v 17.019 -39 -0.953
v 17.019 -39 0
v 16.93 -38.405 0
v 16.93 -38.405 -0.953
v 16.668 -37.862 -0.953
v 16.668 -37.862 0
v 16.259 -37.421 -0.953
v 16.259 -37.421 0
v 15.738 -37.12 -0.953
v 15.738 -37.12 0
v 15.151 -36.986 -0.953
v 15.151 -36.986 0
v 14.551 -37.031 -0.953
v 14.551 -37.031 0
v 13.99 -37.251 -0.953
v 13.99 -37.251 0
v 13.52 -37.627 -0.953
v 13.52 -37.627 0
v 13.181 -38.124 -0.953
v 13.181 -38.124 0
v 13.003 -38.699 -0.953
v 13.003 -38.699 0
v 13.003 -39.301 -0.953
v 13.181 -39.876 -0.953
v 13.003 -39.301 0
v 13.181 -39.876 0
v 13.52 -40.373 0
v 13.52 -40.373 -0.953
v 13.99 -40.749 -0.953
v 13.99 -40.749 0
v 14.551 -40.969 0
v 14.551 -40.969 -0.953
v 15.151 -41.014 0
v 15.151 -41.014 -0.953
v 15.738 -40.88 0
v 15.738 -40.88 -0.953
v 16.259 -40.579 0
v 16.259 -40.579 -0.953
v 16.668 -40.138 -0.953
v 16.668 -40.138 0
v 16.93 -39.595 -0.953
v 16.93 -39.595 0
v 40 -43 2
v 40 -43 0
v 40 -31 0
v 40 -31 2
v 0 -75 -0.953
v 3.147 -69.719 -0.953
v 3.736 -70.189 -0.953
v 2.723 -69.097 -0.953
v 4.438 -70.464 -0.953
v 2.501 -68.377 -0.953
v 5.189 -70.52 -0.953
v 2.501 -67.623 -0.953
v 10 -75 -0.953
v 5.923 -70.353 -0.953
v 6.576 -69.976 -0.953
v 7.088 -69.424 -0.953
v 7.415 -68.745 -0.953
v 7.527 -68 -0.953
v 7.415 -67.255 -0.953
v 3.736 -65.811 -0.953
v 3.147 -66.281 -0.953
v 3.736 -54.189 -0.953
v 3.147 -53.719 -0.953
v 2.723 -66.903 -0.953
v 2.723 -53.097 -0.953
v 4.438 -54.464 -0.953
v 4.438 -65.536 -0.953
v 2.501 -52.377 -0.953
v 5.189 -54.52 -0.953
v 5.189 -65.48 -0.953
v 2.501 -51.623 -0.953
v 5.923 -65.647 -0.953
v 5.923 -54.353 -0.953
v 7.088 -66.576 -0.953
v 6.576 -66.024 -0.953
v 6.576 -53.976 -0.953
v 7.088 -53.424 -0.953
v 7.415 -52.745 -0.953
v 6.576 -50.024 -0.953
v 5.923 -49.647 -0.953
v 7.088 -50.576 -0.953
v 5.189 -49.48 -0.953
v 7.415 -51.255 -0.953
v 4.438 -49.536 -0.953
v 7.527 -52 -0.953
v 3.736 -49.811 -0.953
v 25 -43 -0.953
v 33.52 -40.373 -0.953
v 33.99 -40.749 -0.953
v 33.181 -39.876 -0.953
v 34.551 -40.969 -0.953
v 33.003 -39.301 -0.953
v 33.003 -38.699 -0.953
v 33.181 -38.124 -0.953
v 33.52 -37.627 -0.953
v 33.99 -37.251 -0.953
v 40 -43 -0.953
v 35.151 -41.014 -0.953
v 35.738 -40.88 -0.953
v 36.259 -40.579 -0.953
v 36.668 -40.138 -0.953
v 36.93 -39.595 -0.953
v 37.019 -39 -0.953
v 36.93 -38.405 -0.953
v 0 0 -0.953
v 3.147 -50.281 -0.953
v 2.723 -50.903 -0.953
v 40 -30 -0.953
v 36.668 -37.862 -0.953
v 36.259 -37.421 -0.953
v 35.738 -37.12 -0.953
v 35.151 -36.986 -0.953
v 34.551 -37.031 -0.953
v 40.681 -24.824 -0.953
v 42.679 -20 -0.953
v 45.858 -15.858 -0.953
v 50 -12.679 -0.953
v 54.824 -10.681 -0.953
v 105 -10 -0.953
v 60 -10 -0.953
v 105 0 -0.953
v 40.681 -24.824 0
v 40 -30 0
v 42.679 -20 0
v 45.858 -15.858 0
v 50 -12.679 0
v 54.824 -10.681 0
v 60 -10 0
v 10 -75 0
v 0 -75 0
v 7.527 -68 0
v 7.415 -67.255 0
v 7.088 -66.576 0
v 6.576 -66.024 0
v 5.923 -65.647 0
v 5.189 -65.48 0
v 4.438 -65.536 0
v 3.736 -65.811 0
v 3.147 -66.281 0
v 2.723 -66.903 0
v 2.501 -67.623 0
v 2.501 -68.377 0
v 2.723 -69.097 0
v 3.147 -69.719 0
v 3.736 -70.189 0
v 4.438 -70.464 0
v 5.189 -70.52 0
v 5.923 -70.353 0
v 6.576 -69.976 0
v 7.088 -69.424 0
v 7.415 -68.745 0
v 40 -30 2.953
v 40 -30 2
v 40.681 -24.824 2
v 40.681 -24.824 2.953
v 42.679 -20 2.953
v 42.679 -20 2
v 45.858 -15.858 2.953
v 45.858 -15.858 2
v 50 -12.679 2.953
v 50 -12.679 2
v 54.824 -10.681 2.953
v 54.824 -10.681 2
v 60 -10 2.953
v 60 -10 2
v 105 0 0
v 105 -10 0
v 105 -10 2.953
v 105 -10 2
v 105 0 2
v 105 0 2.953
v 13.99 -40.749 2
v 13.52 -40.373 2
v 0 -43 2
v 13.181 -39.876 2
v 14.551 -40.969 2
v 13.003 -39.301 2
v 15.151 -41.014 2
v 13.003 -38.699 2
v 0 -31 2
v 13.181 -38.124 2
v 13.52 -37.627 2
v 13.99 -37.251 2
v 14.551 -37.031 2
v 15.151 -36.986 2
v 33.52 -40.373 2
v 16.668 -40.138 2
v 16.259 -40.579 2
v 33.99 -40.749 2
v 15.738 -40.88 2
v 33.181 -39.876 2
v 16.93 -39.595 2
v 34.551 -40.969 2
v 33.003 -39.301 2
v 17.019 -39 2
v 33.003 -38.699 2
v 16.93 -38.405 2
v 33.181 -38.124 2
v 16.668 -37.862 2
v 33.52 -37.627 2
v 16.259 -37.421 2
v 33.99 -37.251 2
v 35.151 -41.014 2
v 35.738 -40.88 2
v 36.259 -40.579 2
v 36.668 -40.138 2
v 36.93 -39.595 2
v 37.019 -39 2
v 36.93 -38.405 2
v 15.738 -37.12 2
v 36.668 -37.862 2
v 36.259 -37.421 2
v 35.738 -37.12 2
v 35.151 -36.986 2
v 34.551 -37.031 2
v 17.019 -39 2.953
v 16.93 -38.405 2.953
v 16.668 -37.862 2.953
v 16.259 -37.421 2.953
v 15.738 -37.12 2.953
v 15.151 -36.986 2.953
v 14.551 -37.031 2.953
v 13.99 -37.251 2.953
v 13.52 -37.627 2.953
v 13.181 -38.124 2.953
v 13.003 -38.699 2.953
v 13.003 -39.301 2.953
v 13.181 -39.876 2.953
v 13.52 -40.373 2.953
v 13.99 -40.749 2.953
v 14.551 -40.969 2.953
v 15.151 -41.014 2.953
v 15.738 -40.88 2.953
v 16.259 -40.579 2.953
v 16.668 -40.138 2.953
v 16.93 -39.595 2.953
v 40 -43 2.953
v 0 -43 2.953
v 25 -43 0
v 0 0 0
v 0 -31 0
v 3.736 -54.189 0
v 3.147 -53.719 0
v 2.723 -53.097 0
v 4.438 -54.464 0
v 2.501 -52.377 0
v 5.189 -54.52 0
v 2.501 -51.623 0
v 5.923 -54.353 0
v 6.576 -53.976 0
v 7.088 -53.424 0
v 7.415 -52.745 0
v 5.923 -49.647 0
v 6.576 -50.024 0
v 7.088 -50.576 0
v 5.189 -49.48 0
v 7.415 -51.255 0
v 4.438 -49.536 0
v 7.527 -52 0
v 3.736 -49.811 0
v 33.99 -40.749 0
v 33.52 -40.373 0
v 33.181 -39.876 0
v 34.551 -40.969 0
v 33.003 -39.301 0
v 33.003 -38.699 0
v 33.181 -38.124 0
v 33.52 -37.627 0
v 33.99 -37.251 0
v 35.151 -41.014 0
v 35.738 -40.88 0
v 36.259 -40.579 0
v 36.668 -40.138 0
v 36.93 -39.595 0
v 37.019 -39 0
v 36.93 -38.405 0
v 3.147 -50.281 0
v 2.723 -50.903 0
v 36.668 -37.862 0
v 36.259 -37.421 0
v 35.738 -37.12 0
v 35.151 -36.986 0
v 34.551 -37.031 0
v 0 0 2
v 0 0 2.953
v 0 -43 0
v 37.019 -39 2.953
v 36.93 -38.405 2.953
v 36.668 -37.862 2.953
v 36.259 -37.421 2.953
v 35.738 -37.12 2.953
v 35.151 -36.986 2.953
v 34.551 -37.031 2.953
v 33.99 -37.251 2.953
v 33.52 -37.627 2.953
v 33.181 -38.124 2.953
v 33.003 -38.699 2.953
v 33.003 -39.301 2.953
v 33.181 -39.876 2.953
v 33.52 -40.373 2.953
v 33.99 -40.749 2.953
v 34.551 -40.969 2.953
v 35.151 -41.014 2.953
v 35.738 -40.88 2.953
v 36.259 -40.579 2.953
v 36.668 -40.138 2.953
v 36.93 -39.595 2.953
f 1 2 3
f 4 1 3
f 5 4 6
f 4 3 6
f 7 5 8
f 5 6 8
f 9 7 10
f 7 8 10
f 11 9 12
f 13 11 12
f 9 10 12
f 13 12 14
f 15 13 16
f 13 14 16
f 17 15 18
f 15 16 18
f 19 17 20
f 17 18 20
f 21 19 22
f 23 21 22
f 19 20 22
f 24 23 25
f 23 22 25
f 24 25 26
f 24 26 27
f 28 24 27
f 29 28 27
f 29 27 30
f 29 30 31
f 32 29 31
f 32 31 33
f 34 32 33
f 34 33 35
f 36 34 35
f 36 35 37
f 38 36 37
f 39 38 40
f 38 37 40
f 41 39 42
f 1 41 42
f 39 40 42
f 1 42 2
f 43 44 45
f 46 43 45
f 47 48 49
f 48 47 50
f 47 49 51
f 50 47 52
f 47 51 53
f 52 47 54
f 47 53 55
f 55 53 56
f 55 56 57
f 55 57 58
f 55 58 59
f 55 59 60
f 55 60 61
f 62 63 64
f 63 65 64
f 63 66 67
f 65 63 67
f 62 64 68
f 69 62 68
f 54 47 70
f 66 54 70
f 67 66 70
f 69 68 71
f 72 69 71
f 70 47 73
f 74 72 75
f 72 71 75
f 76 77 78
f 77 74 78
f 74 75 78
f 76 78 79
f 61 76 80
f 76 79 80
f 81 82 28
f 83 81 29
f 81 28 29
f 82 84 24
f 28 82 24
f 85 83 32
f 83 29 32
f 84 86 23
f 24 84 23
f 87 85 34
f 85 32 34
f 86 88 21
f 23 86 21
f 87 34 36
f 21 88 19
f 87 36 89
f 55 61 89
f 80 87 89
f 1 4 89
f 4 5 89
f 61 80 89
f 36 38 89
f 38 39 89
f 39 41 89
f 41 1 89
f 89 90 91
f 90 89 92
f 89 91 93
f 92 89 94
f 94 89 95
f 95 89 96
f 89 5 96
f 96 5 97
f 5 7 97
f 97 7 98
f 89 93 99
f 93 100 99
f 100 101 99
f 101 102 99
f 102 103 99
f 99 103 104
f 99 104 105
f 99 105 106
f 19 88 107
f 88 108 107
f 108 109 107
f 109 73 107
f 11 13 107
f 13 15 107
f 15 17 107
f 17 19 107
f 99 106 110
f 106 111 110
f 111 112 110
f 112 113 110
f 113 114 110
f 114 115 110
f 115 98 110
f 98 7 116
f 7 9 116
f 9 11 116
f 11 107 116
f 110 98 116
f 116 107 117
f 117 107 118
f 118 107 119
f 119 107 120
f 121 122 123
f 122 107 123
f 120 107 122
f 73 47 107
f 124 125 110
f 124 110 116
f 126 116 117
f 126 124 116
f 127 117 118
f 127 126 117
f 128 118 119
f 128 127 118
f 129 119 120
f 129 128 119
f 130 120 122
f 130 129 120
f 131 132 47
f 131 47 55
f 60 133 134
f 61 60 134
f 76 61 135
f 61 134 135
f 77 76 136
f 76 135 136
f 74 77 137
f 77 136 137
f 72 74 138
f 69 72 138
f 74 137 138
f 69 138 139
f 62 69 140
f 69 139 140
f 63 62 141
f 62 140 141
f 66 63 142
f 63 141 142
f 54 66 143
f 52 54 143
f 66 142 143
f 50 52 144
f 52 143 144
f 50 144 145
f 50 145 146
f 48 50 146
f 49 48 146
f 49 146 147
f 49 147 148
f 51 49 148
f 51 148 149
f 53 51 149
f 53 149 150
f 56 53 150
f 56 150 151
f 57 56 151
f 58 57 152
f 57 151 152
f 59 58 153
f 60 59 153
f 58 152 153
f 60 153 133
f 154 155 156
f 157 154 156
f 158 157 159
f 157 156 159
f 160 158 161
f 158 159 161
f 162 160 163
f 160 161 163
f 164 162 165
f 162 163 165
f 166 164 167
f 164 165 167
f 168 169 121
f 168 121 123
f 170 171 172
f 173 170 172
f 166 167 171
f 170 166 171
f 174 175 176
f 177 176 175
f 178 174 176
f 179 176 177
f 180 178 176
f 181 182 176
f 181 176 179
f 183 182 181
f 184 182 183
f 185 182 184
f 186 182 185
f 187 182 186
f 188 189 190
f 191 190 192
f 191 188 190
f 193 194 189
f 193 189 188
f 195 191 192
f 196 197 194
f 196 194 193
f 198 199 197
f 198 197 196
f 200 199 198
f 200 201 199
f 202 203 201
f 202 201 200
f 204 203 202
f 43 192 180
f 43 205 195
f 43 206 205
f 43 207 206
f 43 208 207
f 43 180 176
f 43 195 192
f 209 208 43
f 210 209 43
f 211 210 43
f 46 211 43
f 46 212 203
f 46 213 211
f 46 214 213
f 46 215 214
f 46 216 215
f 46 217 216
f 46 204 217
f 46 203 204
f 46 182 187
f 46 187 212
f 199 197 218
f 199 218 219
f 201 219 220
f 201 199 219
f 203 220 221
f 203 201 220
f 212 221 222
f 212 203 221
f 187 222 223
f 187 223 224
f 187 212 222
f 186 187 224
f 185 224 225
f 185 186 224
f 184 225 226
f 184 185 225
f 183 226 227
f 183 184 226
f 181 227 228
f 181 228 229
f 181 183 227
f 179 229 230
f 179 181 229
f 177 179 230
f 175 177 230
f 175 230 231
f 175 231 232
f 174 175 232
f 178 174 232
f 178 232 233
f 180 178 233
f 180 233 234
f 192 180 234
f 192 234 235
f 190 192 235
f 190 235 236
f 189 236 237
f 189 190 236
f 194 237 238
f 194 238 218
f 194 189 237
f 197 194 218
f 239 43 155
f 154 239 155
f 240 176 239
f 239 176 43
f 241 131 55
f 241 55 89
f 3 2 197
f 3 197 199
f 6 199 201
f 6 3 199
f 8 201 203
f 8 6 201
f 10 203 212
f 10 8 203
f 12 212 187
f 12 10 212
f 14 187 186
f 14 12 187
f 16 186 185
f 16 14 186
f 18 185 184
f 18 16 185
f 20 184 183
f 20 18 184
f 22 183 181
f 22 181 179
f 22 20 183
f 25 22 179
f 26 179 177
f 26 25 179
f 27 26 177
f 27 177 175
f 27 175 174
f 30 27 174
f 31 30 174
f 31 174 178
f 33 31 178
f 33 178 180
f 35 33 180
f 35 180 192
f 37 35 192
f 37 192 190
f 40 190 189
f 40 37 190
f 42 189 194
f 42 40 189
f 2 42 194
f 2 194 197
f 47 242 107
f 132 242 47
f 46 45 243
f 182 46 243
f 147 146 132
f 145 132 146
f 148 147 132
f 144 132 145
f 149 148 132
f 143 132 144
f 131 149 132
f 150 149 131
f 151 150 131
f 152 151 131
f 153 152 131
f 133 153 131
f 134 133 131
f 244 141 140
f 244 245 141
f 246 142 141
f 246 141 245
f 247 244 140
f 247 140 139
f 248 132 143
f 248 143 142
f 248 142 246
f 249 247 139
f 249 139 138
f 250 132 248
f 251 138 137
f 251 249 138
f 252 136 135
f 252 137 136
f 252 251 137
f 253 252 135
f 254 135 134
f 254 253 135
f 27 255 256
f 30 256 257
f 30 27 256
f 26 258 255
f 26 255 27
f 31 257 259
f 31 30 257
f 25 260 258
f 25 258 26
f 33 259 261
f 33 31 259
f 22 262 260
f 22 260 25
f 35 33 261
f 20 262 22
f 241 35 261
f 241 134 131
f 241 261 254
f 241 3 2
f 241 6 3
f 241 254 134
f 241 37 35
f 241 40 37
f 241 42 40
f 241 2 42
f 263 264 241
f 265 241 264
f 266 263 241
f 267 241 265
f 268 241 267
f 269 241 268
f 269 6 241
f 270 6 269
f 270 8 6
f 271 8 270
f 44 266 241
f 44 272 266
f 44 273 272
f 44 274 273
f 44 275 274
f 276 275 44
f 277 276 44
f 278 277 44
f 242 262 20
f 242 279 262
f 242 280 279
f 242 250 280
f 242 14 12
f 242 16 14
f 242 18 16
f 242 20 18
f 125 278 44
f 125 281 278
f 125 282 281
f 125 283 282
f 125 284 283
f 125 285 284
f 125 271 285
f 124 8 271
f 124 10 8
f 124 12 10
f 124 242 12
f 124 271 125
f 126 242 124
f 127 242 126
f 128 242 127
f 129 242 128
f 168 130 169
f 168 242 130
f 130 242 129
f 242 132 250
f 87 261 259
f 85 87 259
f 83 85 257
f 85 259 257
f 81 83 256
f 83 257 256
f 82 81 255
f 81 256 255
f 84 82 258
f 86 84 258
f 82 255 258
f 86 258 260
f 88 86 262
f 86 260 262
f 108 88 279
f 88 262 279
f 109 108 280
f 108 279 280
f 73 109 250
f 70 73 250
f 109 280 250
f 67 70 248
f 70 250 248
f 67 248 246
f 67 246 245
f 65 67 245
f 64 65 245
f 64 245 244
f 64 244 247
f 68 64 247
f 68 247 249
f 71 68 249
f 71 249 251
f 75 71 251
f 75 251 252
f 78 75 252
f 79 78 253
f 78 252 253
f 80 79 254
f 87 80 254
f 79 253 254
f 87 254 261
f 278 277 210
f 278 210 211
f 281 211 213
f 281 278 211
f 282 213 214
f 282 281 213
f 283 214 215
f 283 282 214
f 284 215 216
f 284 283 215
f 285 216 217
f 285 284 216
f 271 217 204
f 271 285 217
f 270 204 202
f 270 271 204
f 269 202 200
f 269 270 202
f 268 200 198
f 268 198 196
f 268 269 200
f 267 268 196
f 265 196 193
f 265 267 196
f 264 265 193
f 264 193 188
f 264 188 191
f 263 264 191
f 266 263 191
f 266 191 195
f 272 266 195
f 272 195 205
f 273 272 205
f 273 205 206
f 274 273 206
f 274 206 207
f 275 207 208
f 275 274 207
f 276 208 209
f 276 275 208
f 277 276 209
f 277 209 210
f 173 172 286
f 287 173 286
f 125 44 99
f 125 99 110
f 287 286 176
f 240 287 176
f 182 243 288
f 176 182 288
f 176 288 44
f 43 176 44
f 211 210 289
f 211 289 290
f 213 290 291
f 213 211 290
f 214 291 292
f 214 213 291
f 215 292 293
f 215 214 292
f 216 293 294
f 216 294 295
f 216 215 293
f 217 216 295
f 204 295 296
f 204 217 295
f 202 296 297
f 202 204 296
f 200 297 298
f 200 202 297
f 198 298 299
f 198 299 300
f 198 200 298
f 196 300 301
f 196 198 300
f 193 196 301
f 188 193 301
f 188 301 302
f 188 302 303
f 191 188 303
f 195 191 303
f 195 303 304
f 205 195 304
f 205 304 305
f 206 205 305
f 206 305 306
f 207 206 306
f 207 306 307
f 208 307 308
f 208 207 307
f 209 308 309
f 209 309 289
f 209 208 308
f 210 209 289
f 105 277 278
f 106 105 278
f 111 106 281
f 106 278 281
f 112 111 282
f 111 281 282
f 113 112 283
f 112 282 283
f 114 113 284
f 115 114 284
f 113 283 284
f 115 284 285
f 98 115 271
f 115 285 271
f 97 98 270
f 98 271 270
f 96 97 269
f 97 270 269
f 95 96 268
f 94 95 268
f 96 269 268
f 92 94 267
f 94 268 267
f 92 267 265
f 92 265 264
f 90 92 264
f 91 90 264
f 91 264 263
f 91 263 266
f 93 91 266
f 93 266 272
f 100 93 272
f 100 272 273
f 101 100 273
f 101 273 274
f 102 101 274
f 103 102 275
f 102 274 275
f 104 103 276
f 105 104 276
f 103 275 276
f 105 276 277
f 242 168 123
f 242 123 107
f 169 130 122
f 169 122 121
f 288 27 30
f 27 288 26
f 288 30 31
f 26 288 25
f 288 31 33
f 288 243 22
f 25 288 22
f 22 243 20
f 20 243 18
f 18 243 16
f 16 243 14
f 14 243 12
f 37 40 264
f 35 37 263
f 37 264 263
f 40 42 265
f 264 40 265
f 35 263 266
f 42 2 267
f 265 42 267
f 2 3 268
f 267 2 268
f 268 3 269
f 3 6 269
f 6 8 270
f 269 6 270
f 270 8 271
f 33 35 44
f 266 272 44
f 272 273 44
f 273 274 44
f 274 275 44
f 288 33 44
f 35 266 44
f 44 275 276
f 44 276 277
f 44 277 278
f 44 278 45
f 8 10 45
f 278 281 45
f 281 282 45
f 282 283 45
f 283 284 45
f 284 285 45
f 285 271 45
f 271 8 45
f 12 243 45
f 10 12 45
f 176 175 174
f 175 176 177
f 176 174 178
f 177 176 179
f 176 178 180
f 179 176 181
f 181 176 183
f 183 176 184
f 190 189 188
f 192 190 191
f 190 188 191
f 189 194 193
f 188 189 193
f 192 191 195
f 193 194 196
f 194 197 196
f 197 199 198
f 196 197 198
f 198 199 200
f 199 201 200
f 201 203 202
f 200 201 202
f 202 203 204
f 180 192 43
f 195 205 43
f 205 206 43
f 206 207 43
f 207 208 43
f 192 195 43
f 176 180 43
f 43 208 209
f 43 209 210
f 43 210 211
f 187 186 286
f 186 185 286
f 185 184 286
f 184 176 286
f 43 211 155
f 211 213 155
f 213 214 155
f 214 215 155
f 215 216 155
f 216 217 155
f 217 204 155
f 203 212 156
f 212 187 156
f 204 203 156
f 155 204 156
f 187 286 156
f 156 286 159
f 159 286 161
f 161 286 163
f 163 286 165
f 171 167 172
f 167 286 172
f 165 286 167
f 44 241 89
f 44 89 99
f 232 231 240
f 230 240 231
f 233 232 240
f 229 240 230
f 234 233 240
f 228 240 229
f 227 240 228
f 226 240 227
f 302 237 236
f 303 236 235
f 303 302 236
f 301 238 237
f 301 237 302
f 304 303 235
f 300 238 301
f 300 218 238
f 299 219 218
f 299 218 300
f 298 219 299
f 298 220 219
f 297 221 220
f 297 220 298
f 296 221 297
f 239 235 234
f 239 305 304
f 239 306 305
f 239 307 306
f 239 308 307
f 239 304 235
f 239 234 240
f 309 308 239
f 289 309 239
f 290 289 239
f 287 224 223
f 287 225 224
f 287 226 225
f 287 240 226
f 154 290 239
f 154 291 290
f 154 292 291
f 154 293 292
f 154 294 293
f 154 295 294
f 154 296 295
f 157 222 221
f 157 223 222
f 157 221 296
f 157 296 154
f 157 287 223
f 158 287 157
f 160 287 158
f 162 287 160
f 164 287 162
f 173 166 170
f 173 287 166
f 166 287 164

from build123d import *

# Parameters (mm, degrees)
F2_R     = 2.0193
F2_R_2   = 2.5273
F3_DEPTH = 0.953
F4_START = 2
F4_DEPTH = 0.953
F5_DEPTH = 2


with BuildPart() as f3:
    # F2 (on Top) → F3 (new body)
    with BuildSketch(Plane.XY):
        with BuildLine():
            Line((105, 0), (0, 0))
            Line((0, 0), (0, -31))
            Line((0, -31), (40, -31))
            Line((40, -31), (40, -30))
            ThreePointArc((40, -30), (45.8578643763, -15.8578643763), (60, -10))
            Line((60, -10), (105, -10))
            Line((105, -10), (105, 0))
        make_face()
        Polygon((40, -31), (0, -31), (0, -43), (25, -43), (40, -43), align=None)
        with Locations((15, -39)):
            Circle(F2_R, mode=Mode.SUBTRACT)
        with Locations((35, -39)):
            Circle(F2_R, mode=Mode.SUBTRACT)
        Polygon((25, -43), (0, -43), (0, -75), (10, -75), align=None)
        with Locations((5, -68)):
            Circle(F2_R_2, mode=Mode.SUBTRACT)
        with Locations((5, -52)):
            Circle(F2_R_2, mode=Mode.SUBTRACT)
    extrude(amount=-F3_DEPTH)


with BuildPart() as f4:
    # F2 (on Top) → F4 (new body)
    with BuildSketch(Plane.XY.offset(F4_START)):
        with BuildLine():
            Line((105, 0), (0, 0))
            Line((0, 0), (0, -31))
            Line((0, -31), (40, -31))
            Line((40, -31), (40, -30))
            ThreePointArc((40, -30), (45.8578643763, -15.8578643763), (60, -10))
            Line((60, -10), (105, -10))
            Line((105, -10), (105, 0))
        make_face()
        Polygon((40, -31), (0, -31), (0, -43), (25, -43), (40, -43), align=None)
        with Locations((15, -39)):
            Circle(F2_R, mode=Mode.SUBTRACT)
        with Locations((35, -39)):
            Circle(F2_R, mode=Mode.SUBTRACT)
    extrude(amount=F4_DEPTH)


with BuildPart() as f5:
    # F2 (on Top) → F5 (new body)
    with BuildSketch(Plane.XY):
        Polygon((40, -31), (0, -31), (0, -43), (25, -43), (40, -43), align=None)
        with Locations((15, -39)):
            Circle(F2_R, mode=Mode.SUBTRACT)
        with Locations((35, -39)):
            Circle(F2_R, mode=Mode.SUBTRACT)
    extrude(amount=F5_DEPTH)


solid = Compound([f3.part, f4.part, f5.part])
